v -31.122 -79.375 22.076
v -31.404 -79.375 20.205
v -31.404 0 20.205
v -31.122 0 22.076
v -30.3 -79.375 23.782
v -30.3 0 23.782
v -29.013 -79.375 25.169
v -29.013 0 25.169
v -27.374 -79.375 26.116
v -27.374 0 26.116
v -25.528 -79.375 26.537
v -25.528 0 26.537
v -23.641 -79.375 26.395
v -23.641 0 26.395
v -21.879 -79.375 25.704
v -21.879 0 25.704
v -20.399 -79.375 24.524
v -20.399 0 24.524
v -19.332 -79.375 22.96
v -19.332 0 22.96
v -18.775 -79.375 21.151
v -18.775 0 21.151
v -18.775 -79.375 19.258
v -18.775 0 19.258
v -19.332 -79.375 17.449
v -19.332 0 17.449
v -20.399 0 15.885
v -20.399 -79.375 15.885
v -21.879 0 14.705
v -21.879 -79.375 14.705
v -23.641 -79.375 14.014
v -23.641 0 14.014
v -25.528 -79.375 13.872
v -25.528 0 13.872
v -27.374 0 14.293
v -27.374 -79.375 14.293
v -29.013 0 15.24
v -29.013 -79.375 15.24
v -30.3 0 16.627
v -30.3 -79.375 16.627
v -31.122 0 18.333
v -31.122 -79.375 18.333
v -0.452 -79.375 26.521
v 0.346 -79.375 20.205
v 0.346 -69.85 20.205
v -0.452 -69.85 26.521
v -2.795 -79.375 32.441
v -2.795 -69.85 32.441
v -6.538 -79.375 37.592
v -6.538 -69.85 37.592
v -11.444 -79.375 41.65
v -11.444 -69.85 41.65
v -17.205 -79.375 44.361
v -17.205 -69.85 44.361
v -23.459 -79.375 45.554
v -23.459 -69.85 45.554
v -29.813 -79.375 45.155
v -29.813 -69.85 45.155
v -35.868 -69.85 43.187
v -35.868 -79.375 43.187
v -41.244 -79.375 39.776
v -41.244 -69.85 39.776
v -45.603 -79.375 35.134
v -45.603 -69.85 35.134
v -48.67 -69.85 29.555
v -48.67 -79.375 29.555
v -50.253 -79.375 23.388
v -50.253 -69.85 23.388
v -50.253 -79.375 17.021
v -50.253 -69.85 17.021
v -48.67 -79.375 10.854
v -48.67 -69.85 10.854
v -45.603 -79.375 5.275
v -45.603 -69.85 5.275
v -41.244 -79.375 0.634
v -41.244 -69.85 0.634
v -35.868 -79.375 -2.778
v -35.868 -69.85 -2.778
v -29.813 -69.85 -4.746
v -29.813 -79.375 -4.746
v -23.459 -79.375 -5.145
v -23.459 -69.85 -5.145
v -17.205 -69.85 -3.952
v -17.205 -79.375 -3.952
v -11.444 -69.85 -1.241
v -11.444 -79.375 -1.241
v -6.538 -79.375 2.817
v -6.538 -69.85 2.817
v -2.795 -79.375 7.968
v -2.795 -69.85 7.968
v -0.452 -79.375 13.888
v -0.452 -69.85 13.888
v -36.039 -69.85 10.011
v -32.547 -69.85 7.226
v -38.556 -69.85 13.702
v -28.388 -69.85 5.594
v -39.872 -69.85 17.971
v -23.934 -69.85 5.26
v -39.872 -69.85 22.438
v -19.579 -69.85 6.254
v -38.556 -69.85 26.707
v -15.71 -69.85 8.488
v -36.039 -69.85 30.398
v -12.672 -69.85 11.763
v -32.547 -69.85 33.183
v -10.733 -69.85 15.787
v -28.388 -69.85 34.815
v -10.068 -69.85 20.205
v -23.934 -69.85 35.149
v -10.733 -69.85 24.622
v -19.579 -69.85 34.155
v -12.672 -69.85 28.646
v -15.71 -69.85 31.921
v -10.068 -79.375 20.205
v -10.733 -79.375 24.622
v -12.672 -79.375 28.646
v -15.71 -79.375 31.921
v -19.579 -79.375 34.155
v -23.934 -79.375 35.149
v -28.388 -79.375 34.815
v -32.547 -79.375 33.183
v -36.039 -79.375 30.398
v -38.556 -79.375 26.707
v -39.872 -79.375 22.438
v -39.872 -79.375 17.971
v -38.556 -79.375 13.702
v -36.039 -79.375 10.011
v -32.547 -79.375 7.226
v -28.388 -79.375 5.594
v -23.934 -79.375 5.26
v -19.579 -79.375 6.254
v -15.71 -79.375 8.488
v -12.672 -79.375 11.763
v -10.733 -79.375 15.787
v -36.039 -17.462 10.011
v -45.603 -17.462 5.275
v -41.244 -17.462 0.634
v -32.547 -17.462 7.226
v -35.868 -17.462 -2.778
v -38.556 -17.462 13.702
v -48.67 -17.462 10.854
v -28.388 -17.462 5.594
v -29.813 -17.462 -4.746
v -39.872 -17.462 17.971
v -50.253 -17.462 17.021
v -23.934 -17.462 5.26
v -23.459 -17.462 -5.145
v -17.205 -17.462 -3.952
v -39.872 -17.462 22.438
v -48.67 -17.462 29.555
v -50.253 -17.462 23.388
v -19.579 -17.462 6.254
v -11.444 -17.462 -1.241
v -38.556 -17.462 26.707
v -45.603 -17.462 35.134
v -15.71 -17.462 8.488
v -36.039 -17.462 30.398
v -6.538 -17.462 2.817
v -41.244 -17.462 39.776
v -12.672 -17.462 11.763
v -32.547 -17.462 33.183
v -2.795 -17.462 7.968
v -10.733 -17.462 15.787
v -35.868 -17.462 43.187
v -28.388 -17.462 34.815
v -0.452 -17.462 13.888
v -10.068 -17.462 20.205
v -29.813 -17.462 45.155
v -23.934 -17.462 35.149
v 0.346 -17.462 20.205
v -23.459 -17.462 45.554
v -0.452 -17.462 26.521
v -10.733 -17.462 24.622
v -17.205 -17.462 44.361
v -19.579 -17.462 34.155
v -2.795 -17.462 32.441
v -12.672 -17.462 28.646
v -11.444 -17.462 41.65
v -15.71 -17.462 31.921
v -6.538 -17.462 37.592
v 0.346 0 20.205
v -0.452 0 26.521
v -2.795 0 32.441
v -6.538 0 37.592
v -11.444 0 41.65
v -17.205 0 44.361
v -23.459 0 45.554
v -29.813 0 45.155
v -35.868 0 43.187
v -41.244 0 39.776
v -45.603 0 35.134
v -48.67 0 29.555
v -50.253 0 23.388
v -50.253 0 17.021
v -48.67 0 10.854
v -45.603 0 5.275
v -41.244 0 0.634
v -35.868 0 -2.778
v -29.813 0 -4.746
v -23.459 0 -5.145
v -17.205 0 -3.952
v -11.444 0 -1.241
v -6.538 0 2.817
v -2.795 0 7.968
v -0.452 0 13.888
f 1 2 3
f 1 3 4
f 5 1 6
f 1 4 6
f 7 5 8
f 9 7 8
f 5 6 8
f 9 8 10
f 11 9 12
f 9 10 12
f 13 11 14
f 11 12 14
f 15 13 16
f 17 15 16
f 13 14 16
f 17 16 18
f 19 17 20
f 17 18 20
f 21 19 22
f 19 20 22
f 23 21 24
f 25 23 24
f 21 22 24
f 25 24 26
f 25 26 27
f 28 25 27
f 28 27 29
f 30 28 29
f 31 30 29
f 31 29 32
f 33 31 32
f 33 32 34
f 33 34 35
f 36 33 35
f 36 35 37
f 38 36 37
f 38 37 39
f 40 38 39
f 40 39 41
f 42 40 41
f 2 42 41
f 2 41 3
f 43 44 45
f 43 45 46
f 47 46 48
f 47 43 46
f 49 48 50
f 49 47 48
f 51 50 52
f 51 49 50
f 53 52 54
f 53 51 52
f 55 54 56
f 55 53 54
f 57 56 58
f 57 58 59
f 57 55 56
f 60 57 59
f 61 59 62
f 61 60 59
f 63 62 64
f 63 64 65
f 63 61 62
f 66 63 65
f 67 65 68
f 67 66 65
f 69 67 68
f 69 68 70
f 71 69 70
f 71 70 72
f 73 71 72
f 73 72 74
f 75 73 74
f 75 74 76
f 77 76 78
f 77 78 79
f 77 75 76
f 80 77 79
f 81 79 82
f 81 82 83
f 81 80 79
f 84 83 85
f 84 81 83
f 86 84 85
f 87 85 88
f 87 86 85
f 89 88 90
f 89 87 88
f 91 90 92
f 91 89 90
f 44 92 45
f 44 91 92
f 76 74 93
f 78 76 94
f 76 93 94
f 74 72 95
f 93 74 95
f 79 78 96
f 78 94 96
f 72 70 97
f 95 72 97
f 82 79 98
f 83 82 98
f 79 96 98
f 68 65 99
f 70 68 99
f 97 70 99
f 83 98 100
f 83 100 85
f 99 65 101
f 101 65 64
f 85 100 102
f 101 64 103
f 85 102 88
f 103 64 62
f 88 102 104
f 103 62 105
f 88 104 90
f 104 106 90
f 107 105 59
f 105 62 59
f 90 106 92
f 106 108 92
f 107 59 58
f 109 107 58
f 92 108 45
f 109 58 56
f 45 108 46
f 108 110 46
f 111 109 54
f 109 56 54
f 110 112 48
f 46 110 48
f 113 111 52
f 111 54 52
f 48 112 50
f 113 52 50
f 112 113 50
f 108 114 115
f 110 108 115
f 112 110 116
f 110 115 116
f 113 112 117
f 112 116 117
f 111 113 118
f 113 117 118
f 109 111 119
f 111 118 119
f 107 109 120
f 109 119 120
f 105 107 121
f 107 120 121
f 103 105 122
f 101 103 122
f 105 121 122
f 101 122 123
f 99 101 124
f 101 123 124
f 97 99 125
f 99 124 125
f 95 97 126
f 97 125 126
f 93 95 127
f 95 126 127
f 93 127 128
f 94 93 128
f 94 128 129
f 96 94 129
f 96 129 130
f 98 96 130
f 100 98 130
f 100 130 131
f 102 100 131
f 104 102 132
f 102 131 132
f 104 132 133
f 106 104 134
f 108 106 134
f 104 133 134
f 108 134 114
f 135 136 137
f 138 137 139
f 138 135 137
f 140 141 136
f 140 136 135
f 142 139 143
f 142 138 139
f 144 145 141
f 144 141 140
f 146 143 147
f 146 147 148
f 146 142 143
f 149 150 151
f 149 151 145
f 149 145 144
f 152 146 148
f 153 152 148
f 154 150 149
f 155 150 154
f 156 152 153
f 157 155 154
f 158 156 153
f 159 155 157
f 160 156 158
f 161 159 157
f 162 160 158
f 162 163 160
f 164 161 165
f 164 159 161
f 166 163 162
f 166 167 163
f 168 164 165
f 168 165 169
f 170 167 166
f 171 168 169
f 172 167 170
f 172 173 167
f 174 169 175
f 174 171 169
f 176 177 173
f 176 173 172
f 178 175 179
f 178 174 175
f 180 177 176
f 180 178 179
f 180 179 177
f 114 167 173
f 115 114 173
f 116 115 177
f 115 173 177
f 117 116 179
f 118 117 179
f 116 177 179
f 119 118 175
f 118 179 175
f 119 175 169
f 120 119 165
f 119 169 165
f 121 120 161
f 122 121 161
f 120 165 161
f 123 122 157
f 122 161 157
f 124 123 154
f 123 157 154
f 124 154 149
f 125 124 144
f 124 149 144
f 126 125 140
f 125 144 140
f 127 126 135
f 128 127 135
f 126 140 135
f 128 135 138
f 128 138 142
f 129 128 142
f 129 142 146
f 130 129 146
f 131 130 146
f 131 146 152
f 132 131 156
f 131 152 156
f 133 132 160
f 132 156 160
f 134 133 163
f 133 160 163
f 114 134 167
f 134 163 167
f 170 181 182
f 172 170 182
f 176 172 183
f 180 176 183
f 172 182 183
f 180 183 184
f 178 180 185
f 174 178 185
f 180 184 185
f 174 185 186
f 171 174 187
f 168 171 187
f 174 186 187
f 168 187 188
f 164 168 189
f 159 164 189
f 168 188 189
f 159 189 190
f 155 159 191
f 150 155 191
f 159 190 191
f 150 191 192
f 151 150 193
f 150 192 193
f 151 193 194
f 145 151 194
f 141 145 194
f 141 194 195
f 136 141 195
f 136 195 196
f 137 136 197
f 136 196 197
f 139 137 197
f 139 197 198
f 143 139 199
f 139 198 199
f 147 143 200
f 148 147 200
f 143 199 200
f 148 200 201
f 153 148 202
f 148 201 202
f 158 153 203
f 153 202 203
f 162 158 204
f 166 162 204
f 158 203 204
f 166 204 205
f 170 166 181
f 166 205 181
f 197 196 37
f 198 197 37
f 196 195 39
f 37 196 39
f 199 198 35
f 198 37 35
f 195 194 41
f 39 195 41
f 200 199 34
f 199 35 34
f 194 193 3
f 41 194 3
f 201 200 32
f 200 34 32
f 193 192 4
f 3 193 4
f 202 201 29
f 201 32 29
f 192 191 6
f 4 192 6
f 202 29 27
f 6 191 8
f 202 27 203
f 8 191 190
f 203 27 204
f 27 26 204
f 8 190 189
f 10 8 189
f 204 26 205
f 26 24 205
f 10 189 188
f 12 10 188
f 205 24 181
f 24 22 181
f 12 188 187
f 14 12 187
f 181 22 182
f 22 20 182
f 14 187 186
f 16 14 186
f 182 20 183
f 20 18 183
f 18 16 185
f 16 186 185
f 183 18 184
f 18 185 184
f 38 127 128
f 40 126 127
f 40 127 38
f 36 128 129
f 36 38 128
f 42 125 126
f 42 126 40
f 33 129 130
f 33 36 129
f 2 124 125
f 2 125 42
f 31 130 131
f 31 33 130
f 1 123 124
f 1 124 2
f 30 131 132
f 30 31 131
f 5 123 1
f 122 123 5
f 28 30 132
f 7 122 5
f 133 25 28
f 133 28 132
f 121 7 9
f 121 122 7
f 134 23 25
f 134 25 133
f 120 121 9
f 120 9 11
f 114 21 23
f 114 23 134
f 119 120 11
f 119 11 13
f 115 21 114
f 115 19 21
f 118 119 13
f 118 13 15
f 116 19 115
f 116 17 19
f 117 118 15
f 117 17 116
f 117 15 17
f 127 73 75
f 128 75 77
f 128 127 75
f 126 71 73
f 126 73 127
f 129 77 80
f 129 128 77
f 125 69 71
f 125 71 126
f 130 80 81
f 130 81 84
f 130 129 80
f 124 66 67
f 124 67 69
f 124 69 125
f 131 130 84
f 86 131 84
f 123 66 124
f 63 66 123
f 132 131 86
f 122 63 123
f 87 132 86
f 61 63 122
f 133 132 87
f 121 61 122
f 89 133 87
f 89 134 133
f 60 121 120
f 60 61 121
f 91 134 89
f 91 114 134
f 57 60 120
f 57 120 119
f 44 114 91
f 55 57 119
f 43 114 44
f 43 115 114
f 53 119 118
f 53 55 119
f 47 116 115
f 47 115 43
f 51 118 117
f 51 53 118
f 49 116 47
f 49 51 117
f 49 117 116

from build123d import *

# Parameters (mm, degrees)
F0_R     = 25.4
F1_DEPTH = 17.4625
F2_R     = 14.986
F3_DEPTH = 61.9125
F4_R     = 25.4
F4_R_2   = 14.986
F5_DEPTH = 9.525
F6_R     = 6.35
F7_DEPTH = 79.376


with BuildPart() as f1:
    # F0 (on Front) → F1 (new body)
    with BuildSketch(Plane.XZ):
        with Locations((-25.0536371022, 20.2045440674)):
            Circle(F0_R)
    extrude(amount=F1_DEPTH)

    # F2 (on face) → F3 (join)
    with BuildSketch(Plane.XZ.offset(17.4625)):
        with Locations((-25.0536371022, 20.2045440674)):
            Circle(F2_R)
    extrude(amount=F3_DEPTH)

    # F6 (on face) → F7 (cut, through all)
    with BuildSketch(Plane(origin=(0, 0, 0), x_dir=(-1, 0, 0), z_dir=(0, 1, 0))):
        with Locations((25.0536371022, 20.2045440674)):
            Circle(F6_R)
    extrude(amount=-F7_DEPTH, mode=Mode.SUBTRACT)


with BuildPart() as f5:
    # F4 (on face) → F5 (new body)
    with BuildSketch(Plane.XZ.offset(79.375)):
        with Locations((-25.0536371022, 20.2045440674)):
            Circle(F4_R)
        with Locations((-25.0536371022, 20.2045440674)):
            Circle(F4_R_2, mode=Mode.SUBTRACT)
    extrude(amount=-F5_DEPTH)


solid = Compound([f1.part, f5.part])
